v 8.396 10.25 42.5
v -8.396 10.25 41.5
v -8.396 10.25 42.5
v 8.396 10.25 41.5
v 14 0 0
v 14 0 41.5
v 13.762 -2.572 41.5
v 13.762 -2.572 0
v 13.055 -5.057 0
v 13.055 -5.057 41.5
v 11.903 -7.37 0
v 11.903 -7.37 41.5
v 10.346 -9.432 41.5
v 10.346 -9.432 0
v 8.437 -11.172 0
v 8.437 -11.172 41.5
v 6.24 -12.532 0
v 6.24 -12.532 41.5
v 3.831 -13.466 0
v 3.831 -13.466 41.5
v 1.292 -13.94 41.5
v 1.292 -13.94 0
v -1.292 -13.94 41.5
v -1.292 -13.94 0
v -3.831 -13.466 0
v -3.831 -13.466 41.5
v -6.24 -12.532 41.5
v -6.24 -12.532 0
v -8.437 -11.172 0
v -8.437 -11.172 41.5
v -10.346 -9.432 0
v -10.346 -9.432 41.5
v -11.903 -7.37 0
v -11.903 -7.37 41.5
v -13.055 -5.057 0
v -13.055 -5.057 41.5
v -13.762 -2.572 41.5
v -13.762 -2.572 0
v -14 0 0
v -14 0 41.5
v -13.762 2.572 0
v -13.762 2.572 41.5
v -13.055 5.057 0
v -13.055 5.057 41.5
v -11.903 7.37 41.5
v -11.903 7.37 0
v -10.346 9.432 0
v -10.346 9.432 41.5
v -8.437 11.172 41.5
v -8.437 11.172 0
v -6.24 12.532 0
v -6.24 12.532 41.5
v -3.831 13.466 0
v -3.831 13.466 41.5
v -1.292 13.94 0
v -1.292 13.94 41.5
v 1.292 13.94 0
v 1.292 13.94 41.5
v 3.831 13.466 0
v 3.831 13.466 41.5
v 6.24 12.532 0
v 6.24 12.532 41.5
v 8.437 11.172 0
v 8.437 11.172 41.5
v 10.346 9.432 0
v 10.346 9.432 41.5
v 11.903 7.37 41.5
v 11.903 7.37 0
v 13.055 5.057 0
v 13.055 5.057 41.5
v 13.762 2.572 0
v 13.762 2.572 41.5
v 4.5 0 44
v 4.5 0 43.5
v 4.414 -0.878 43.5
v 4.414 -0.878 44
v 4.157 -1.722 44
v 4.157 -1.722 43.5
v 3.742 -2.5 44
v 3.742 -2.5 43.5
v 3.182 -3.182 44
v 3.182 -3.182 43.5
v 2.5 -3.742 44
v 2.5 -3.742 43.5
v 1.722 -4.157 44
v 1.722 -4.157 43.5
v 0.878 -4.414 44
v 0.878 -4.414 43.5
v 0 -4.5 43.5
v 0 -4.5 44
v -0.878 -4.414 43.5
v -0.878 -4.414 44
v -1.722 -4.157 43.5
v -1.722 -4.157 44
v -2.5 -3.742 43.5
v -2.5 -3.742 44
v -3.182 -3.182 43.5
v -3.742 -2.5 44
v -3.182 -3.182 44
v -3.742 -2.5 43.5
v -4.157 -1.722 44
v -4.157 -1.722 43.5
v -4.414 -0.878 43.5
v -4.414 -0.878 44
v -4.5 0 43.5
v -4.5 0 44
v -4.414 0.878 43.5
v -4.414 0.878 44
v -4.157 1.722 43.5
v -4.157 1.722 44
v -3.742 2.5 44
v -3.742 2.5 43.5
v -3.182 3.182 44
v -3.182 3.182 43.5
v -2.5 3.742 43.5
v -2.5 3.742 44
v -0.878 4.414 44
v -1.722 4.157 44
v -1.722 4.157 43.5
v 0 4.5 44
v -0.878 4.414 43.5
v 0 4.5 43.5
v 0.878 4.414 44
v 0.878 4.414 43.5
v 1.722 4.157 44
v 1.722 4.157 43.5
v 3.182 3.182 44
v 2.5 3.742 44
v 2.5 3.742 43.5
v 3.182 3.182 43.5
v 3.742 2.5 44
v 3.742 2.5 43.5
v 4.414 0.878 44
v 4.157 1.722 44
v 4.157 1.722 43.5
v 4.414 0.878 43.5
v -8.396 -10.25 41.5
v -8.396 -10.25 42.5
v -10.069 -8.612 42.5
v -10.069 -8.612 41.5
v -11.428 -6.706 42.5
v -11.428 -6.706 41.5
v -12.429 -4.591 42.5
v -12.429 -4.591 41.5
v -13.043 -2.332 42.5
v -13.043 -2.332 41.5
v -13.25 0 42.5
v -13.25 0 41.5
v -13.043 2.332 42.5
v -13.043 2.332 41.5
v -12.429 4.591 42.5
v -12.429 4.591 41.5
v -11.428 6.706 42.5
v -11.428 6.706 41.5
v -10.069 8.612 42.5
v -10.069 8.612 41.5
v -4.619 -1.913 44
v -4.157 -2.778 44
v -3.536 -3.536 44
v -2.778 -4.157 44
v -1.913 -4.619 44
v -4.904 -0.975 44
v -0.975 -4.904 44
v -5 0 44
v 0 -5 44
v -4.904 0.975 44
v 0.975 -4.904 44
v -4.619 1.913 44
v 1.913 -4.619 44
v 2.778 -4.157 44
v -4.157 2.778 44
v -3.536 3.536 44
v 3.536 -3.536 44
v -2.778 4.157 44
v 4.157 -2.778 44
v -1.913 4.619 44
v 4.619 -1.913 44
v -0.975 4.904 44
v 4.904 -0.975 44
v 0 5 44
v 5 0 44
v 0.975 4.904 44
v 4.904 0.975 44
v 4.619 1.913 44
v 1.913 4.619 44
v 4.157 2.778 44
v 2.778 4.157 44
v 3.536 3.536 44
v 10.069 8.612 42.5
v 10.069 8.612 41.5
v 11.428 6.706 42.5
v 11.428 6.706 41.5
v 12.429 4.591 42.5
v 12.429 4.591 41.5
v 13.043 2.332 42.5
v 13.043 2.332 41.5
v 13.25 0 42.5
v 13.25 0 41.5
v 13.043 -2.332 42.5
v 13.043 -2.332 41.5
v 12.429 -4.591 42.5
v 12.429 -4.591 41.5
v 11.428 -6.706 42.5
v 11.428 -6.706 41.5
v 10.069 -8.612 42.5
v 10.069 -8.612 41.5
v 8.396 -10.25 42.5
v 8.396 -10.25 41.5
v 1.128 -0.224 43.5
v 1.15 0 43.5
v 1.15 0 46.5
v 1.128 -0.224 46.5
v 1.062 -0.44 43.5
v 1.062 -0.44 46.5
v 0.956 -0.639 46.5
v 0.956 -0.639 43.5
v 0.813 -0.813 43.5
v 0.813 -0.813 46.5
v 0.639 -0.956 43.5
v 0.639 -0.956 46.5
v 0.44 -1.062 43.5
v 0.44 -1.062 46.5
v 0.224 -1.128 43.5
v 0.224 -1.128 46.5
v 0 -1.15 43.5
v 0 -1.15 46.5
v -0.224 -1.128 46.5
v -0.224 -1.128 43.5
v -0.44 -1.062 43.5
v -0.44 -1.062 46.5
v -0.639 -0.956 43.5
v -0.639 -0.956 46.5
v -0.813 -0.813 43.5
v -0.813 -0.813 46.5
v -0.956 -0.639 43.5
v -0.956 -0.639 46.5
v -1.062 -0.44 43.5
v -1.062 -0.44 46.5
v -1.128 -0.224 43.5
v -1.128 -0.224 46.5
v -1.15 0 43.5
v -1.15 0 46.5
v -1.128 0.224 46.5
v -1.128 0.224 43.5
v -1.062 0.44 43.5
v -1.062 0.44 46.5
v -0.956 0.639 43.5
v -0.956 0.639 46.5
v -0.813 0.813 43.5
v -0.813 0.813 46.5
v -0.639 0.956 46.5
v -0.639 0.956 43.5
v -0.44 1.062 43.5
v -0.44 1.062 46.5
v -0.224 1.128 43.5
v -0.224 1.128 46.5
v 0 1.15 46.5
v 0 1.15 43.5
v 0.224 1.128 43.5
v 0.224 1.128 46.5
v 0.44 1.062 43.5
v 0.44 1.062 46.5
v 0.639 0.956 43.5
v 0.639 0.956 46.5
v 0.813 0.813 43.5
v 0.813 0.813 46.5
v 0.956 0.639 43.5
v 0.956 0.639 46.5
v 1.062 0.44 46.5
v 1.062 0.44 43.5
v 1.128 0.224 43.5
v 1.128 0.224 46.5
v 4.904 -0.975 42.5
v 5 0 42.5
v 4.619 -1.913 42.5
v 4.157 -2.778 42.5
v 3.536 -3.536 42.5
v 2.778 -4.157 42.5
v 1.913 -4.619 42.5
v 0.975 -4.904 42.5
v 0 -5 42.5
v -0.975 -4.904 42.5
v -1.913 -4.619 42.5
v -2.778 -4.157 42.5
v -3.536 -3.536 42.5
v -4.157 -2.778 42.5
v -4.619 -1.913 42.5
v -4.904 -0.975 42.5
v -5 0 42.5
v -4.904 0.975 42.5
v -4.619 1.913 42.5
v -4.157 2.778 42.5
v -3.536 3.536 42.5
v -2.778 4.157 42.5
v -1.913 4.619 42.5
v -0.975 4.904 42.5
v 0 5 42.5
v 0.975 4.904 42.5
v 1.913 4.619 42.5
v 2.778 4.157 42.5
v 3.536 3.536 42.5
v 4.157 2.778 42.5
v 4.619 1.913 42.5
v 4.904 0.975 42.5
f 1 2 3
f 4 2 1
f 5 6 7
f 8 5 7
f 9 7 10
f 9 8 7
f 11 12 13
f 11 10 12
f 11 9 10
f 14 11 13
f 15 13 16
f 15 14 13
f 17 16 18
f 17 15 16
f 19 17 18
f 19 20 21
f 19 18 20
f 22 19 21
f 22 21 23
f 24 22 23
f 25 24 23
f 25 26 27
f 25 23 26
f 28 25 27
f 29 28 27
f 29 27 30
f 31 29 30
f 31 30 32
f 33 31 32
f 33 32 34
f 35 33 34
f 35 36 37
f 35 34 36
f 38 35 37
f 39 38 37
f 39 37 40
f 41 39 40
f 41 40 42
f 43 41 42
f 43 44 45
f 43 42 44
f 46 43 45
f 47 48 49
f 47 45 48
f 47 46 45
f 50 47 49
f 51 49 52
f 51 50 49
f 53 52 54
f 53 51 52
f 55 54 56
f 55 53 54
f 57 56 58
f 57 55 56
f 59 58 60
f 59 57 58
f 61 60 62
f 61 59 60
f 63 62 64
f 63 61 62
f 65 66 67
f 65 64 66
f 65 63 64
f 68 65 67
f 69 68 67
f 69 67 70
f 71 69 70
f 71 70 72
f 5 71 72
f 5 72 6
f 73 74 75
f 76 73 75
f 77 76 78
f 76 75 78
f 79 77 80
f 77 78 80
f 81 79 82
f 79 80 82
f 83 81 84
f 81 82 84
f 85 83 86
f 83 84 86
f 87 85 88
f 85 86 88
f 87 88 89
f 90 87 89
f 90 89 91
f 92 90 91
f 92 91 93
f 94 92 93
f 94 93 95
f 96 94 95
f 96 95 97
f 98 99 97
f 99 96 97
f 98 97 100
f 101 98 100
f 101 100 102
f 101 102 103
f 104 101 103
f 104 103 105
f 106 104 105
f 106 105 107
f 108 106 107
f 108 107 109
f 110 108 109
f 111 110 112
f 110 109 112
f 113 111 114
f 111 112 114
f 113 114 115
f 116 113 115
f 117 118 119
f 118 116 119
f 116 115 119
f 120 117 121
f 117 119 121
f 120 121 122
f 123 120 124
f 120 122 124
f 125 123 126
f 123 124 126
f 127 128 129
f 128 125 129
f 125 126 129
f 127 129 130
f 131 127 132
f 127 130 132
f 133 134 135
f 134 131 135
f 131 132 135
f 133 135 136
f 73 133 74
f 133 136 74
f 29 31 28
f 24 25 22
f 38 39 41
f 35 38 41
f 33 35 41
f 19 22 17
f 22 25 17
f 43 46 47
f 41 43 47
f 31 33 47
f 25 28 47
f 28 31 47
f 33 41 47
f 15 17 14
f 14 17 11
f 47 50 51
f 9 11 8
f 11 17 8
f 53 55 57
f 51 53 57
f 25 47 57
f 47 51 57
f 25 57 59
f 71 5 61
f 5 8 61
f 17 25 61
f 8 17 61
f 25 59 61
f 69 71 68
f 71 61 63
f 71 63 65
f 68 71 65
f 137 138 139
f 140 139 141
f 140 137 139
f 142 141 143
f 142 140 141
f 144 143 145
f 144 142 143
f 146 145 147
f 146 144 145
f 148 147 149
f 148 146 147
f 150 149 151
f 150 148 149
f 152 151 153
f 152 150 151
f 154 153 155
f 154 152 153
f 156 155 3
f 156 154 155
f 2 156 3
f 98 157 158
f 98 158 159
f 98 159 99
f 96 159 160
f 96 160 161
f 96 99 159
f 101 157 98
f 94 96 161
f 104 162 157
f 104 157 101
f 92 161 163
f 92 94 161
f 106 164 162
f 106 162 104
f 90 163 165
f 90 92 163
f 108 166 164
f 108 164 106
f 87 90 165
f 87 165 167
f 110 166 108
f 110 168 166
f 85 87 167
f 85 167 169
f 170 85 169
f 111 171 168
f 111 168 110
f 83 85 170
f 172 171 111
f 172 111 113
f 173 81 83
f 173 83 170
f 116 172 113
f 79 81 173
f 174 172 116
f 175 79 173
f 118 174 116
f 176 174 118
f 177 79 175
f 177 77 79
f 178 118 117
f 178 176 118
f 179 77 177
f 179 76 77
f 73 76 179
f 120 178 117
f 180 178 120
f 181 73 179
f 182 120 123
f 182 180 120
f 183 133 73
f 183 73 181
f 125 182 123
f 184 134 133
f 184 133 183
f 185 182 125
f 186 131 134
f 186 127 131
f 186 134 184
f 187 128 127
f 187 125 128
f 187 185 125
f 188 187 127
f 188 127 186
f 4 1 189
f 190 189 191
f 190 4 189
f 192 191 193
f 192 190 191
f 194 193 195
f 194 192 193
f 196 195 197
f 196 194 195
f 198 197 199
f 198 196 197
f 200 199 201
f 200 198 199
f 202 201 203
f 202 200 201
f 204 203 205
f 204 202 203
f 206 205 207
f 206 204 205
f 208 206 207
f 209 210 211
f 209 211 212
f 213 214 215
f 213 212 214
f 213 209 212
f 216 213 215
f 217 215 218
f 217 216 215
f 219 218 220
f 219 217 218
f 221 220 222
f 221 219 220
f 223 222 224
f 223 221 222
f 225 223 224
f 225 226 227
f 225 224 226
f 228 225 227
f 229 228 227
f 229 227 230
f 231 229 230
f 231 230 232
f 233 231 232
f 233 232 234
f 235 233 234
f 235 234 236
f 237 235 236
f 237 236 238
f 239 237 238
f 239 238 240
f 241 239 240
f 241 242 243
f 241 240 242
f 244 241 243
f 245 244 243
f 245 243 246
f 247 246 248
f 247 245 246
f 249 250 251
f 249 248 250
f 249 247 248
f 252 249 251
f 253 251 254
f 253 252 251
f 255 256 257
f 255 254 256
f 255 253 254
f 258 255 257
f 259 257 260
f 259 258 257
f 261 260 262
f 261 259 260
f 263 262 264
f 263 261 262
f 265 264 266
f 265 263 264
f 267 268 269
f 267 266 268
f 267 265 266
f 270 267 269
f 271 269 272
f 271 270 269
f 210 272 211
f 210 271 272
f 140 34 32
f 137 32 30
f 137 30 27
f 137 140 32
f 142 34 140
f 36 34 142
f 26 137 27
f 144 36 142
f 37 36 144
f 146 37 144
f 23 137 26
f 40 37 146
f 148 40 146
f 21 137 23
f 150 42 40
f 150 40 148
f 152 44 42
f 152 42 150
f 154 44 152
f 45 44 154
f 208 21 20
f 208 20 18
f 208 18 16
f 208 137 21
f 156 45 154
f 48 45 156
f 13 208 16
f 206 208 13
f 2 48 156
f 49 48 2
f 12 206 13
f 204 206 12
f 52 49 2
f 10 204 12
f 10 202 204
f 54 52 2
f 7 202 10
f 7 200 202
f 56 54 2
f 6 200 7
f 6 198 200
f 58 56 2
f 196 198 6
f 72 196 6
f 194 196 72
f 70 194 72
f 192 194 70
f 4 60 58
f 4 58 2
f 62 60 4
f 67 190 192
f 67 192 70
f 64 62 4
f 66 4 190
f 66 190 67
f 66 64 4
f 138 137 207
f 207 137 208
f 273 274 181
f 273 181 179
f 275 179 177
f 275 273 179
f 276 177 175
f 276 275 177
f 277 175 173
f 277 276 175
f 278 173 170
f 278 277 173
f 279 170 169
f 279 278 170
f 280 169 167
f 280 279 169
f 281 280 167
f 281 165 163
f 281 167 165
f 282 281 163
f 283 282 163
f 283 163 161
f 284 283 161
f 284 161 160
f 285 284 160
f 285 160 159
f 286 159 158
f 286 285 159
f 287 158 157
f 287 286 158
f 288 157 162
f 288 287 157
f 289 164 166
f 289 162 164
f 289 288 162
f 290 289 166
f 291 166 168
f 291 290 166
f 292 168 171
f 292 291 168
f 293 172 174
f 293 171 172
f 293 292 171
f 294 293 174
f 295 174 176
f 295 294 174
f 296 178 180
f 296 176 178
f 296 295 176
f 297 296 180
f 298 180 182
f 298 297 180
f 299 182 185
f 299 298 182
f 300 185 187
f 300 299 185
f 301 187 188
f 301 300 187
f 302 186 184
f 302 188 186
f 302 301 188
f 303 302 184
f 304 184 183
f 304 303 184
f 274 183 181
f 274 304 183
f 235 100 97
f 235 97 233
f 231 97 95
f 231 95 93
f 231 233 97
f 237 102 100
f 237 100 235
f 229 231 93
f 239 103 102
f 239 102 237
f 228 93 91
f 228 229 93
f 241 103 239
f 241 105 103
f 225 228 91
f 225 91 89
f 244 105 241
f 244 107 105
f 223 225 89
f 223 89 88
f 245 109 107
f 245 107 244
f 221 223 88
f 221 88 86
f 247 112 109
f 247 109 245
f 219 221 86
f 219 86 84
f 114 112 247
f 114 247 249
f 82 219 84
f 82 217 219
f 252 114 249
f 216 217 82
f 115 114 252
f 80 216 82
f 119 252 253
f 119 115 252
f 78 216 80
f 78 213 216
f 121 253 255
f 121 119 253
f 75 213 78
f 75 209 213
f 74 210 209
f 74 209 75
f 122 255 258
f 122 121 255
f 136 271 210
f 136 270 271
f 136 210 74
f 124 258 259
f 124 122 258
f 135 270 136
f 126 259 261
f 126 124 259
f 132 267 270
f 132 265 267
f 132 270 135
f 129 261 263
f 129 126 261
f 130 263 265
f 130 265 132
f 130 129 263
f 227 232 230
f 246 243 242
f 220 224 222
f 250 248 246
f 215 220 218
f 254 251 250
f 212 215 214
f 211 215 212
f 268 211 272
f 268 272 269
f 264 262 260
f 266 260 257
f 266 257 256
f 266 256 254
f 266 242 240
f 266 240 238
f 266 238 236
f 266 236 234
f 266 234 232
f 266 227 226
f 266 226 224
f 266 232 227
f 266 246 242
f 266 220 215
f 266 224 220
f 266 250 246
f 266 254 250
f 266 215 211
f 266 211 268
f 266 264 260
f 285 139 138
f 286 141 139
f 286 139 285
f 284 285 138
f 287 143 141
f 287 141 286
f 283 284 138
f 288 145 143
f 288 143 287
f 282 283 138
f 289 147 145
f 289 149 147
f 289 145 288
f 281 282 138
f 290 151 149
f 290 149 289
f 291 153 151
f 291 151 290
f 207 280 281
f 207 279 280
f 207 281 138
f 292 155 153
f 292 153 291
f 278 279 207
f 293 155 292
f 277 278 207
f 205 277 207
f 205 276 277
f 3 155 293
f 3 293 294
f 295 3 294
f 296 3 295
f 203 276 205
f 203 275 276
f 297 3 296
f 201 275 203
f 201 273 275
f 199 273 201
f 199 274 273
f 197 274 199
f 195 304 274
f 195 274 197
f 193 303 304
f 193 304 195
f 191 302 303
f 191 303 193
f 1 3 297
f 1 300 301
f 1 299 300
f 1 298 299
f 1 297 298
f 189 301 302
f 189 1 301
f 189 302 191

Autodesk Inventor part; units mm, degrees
ref_plane "YZ Plane" through (0, 0, 0) normal (1, 0, 0) x (0, 1, 0)
ref_plane "XZ Plane" through (0, 0, 0) normal (0, 1, 0) x (-1, 0, 0)
ref_plane "XY Plane" through (0, 0, 0) normal (0, 0, 1) x (1, 0, 0)
sketch "Sketch1" plane through (0, 0, 0) normal (0, 0, 1) x (1, 0, 0)
  circle A0 centre (0, 0) radius 14
  dimension "d0" = 28
extrude "Extrusion1" add sketch "Sketch1" along normal blind 41.5
sketch "Sketch2" plane through (0, 0, 41.5) normal (0, 0, 1) x (1, 0, 0)
  line L0 (-8.3964, 10.25) -> (8.3964, 10.25)
  line L1 (-8.3964, -10.25) -> (8.3964, -10.25)
  line L2 (-19.6, 0) -> (19.6, 0) projected
  arc A0 (8.3964, -10.25) -> (8.3964, 10.25) centre (0, 0) ccw
  arc A1 (-8.3964, 10.25) -> (-8.3964, -10.25) centre (0, 0) ccw
  dimension "d4" = 10.25
  dimension "d5" = 10.25
extrude "Extrusion2" add sketch "Sketch2" along normal blind 1
sketch "Sketch3" plane through (0, 0, 42.5) normal (0, 0, 1) x (1, 0, 0)
  circle A0 centre (0, 0) radius 5
  circle A1 centre (0, 0) radius 4.5
  dimension "d8" = 10
  dimension "d9" = 9
extrude "Extrusion3" add sketch "Sketch3" along normal blind 1.5
sketch "Sketch4" plane through (0, 0, 42.5) normal (0, 0, 1) x (1, 0, 0)
  circle A0 centre (0, 0) radius 4.5
  dimension "d12" = 9
extrude "Extrusion4" add sketch "Sketch4" along normal blind 1
sketch "Sketch5" plane through (0, 0, 43.5) normal (0, 0, 1) x (1, 0, 0)
  circle A0 centre (0, 0) radius 1.15
  dimension "d15" = 2.3
extrude "Extrusion5" add sketch "Sketch5" along normal blind 3
properties part number "E600T_RC390_motor_front"
